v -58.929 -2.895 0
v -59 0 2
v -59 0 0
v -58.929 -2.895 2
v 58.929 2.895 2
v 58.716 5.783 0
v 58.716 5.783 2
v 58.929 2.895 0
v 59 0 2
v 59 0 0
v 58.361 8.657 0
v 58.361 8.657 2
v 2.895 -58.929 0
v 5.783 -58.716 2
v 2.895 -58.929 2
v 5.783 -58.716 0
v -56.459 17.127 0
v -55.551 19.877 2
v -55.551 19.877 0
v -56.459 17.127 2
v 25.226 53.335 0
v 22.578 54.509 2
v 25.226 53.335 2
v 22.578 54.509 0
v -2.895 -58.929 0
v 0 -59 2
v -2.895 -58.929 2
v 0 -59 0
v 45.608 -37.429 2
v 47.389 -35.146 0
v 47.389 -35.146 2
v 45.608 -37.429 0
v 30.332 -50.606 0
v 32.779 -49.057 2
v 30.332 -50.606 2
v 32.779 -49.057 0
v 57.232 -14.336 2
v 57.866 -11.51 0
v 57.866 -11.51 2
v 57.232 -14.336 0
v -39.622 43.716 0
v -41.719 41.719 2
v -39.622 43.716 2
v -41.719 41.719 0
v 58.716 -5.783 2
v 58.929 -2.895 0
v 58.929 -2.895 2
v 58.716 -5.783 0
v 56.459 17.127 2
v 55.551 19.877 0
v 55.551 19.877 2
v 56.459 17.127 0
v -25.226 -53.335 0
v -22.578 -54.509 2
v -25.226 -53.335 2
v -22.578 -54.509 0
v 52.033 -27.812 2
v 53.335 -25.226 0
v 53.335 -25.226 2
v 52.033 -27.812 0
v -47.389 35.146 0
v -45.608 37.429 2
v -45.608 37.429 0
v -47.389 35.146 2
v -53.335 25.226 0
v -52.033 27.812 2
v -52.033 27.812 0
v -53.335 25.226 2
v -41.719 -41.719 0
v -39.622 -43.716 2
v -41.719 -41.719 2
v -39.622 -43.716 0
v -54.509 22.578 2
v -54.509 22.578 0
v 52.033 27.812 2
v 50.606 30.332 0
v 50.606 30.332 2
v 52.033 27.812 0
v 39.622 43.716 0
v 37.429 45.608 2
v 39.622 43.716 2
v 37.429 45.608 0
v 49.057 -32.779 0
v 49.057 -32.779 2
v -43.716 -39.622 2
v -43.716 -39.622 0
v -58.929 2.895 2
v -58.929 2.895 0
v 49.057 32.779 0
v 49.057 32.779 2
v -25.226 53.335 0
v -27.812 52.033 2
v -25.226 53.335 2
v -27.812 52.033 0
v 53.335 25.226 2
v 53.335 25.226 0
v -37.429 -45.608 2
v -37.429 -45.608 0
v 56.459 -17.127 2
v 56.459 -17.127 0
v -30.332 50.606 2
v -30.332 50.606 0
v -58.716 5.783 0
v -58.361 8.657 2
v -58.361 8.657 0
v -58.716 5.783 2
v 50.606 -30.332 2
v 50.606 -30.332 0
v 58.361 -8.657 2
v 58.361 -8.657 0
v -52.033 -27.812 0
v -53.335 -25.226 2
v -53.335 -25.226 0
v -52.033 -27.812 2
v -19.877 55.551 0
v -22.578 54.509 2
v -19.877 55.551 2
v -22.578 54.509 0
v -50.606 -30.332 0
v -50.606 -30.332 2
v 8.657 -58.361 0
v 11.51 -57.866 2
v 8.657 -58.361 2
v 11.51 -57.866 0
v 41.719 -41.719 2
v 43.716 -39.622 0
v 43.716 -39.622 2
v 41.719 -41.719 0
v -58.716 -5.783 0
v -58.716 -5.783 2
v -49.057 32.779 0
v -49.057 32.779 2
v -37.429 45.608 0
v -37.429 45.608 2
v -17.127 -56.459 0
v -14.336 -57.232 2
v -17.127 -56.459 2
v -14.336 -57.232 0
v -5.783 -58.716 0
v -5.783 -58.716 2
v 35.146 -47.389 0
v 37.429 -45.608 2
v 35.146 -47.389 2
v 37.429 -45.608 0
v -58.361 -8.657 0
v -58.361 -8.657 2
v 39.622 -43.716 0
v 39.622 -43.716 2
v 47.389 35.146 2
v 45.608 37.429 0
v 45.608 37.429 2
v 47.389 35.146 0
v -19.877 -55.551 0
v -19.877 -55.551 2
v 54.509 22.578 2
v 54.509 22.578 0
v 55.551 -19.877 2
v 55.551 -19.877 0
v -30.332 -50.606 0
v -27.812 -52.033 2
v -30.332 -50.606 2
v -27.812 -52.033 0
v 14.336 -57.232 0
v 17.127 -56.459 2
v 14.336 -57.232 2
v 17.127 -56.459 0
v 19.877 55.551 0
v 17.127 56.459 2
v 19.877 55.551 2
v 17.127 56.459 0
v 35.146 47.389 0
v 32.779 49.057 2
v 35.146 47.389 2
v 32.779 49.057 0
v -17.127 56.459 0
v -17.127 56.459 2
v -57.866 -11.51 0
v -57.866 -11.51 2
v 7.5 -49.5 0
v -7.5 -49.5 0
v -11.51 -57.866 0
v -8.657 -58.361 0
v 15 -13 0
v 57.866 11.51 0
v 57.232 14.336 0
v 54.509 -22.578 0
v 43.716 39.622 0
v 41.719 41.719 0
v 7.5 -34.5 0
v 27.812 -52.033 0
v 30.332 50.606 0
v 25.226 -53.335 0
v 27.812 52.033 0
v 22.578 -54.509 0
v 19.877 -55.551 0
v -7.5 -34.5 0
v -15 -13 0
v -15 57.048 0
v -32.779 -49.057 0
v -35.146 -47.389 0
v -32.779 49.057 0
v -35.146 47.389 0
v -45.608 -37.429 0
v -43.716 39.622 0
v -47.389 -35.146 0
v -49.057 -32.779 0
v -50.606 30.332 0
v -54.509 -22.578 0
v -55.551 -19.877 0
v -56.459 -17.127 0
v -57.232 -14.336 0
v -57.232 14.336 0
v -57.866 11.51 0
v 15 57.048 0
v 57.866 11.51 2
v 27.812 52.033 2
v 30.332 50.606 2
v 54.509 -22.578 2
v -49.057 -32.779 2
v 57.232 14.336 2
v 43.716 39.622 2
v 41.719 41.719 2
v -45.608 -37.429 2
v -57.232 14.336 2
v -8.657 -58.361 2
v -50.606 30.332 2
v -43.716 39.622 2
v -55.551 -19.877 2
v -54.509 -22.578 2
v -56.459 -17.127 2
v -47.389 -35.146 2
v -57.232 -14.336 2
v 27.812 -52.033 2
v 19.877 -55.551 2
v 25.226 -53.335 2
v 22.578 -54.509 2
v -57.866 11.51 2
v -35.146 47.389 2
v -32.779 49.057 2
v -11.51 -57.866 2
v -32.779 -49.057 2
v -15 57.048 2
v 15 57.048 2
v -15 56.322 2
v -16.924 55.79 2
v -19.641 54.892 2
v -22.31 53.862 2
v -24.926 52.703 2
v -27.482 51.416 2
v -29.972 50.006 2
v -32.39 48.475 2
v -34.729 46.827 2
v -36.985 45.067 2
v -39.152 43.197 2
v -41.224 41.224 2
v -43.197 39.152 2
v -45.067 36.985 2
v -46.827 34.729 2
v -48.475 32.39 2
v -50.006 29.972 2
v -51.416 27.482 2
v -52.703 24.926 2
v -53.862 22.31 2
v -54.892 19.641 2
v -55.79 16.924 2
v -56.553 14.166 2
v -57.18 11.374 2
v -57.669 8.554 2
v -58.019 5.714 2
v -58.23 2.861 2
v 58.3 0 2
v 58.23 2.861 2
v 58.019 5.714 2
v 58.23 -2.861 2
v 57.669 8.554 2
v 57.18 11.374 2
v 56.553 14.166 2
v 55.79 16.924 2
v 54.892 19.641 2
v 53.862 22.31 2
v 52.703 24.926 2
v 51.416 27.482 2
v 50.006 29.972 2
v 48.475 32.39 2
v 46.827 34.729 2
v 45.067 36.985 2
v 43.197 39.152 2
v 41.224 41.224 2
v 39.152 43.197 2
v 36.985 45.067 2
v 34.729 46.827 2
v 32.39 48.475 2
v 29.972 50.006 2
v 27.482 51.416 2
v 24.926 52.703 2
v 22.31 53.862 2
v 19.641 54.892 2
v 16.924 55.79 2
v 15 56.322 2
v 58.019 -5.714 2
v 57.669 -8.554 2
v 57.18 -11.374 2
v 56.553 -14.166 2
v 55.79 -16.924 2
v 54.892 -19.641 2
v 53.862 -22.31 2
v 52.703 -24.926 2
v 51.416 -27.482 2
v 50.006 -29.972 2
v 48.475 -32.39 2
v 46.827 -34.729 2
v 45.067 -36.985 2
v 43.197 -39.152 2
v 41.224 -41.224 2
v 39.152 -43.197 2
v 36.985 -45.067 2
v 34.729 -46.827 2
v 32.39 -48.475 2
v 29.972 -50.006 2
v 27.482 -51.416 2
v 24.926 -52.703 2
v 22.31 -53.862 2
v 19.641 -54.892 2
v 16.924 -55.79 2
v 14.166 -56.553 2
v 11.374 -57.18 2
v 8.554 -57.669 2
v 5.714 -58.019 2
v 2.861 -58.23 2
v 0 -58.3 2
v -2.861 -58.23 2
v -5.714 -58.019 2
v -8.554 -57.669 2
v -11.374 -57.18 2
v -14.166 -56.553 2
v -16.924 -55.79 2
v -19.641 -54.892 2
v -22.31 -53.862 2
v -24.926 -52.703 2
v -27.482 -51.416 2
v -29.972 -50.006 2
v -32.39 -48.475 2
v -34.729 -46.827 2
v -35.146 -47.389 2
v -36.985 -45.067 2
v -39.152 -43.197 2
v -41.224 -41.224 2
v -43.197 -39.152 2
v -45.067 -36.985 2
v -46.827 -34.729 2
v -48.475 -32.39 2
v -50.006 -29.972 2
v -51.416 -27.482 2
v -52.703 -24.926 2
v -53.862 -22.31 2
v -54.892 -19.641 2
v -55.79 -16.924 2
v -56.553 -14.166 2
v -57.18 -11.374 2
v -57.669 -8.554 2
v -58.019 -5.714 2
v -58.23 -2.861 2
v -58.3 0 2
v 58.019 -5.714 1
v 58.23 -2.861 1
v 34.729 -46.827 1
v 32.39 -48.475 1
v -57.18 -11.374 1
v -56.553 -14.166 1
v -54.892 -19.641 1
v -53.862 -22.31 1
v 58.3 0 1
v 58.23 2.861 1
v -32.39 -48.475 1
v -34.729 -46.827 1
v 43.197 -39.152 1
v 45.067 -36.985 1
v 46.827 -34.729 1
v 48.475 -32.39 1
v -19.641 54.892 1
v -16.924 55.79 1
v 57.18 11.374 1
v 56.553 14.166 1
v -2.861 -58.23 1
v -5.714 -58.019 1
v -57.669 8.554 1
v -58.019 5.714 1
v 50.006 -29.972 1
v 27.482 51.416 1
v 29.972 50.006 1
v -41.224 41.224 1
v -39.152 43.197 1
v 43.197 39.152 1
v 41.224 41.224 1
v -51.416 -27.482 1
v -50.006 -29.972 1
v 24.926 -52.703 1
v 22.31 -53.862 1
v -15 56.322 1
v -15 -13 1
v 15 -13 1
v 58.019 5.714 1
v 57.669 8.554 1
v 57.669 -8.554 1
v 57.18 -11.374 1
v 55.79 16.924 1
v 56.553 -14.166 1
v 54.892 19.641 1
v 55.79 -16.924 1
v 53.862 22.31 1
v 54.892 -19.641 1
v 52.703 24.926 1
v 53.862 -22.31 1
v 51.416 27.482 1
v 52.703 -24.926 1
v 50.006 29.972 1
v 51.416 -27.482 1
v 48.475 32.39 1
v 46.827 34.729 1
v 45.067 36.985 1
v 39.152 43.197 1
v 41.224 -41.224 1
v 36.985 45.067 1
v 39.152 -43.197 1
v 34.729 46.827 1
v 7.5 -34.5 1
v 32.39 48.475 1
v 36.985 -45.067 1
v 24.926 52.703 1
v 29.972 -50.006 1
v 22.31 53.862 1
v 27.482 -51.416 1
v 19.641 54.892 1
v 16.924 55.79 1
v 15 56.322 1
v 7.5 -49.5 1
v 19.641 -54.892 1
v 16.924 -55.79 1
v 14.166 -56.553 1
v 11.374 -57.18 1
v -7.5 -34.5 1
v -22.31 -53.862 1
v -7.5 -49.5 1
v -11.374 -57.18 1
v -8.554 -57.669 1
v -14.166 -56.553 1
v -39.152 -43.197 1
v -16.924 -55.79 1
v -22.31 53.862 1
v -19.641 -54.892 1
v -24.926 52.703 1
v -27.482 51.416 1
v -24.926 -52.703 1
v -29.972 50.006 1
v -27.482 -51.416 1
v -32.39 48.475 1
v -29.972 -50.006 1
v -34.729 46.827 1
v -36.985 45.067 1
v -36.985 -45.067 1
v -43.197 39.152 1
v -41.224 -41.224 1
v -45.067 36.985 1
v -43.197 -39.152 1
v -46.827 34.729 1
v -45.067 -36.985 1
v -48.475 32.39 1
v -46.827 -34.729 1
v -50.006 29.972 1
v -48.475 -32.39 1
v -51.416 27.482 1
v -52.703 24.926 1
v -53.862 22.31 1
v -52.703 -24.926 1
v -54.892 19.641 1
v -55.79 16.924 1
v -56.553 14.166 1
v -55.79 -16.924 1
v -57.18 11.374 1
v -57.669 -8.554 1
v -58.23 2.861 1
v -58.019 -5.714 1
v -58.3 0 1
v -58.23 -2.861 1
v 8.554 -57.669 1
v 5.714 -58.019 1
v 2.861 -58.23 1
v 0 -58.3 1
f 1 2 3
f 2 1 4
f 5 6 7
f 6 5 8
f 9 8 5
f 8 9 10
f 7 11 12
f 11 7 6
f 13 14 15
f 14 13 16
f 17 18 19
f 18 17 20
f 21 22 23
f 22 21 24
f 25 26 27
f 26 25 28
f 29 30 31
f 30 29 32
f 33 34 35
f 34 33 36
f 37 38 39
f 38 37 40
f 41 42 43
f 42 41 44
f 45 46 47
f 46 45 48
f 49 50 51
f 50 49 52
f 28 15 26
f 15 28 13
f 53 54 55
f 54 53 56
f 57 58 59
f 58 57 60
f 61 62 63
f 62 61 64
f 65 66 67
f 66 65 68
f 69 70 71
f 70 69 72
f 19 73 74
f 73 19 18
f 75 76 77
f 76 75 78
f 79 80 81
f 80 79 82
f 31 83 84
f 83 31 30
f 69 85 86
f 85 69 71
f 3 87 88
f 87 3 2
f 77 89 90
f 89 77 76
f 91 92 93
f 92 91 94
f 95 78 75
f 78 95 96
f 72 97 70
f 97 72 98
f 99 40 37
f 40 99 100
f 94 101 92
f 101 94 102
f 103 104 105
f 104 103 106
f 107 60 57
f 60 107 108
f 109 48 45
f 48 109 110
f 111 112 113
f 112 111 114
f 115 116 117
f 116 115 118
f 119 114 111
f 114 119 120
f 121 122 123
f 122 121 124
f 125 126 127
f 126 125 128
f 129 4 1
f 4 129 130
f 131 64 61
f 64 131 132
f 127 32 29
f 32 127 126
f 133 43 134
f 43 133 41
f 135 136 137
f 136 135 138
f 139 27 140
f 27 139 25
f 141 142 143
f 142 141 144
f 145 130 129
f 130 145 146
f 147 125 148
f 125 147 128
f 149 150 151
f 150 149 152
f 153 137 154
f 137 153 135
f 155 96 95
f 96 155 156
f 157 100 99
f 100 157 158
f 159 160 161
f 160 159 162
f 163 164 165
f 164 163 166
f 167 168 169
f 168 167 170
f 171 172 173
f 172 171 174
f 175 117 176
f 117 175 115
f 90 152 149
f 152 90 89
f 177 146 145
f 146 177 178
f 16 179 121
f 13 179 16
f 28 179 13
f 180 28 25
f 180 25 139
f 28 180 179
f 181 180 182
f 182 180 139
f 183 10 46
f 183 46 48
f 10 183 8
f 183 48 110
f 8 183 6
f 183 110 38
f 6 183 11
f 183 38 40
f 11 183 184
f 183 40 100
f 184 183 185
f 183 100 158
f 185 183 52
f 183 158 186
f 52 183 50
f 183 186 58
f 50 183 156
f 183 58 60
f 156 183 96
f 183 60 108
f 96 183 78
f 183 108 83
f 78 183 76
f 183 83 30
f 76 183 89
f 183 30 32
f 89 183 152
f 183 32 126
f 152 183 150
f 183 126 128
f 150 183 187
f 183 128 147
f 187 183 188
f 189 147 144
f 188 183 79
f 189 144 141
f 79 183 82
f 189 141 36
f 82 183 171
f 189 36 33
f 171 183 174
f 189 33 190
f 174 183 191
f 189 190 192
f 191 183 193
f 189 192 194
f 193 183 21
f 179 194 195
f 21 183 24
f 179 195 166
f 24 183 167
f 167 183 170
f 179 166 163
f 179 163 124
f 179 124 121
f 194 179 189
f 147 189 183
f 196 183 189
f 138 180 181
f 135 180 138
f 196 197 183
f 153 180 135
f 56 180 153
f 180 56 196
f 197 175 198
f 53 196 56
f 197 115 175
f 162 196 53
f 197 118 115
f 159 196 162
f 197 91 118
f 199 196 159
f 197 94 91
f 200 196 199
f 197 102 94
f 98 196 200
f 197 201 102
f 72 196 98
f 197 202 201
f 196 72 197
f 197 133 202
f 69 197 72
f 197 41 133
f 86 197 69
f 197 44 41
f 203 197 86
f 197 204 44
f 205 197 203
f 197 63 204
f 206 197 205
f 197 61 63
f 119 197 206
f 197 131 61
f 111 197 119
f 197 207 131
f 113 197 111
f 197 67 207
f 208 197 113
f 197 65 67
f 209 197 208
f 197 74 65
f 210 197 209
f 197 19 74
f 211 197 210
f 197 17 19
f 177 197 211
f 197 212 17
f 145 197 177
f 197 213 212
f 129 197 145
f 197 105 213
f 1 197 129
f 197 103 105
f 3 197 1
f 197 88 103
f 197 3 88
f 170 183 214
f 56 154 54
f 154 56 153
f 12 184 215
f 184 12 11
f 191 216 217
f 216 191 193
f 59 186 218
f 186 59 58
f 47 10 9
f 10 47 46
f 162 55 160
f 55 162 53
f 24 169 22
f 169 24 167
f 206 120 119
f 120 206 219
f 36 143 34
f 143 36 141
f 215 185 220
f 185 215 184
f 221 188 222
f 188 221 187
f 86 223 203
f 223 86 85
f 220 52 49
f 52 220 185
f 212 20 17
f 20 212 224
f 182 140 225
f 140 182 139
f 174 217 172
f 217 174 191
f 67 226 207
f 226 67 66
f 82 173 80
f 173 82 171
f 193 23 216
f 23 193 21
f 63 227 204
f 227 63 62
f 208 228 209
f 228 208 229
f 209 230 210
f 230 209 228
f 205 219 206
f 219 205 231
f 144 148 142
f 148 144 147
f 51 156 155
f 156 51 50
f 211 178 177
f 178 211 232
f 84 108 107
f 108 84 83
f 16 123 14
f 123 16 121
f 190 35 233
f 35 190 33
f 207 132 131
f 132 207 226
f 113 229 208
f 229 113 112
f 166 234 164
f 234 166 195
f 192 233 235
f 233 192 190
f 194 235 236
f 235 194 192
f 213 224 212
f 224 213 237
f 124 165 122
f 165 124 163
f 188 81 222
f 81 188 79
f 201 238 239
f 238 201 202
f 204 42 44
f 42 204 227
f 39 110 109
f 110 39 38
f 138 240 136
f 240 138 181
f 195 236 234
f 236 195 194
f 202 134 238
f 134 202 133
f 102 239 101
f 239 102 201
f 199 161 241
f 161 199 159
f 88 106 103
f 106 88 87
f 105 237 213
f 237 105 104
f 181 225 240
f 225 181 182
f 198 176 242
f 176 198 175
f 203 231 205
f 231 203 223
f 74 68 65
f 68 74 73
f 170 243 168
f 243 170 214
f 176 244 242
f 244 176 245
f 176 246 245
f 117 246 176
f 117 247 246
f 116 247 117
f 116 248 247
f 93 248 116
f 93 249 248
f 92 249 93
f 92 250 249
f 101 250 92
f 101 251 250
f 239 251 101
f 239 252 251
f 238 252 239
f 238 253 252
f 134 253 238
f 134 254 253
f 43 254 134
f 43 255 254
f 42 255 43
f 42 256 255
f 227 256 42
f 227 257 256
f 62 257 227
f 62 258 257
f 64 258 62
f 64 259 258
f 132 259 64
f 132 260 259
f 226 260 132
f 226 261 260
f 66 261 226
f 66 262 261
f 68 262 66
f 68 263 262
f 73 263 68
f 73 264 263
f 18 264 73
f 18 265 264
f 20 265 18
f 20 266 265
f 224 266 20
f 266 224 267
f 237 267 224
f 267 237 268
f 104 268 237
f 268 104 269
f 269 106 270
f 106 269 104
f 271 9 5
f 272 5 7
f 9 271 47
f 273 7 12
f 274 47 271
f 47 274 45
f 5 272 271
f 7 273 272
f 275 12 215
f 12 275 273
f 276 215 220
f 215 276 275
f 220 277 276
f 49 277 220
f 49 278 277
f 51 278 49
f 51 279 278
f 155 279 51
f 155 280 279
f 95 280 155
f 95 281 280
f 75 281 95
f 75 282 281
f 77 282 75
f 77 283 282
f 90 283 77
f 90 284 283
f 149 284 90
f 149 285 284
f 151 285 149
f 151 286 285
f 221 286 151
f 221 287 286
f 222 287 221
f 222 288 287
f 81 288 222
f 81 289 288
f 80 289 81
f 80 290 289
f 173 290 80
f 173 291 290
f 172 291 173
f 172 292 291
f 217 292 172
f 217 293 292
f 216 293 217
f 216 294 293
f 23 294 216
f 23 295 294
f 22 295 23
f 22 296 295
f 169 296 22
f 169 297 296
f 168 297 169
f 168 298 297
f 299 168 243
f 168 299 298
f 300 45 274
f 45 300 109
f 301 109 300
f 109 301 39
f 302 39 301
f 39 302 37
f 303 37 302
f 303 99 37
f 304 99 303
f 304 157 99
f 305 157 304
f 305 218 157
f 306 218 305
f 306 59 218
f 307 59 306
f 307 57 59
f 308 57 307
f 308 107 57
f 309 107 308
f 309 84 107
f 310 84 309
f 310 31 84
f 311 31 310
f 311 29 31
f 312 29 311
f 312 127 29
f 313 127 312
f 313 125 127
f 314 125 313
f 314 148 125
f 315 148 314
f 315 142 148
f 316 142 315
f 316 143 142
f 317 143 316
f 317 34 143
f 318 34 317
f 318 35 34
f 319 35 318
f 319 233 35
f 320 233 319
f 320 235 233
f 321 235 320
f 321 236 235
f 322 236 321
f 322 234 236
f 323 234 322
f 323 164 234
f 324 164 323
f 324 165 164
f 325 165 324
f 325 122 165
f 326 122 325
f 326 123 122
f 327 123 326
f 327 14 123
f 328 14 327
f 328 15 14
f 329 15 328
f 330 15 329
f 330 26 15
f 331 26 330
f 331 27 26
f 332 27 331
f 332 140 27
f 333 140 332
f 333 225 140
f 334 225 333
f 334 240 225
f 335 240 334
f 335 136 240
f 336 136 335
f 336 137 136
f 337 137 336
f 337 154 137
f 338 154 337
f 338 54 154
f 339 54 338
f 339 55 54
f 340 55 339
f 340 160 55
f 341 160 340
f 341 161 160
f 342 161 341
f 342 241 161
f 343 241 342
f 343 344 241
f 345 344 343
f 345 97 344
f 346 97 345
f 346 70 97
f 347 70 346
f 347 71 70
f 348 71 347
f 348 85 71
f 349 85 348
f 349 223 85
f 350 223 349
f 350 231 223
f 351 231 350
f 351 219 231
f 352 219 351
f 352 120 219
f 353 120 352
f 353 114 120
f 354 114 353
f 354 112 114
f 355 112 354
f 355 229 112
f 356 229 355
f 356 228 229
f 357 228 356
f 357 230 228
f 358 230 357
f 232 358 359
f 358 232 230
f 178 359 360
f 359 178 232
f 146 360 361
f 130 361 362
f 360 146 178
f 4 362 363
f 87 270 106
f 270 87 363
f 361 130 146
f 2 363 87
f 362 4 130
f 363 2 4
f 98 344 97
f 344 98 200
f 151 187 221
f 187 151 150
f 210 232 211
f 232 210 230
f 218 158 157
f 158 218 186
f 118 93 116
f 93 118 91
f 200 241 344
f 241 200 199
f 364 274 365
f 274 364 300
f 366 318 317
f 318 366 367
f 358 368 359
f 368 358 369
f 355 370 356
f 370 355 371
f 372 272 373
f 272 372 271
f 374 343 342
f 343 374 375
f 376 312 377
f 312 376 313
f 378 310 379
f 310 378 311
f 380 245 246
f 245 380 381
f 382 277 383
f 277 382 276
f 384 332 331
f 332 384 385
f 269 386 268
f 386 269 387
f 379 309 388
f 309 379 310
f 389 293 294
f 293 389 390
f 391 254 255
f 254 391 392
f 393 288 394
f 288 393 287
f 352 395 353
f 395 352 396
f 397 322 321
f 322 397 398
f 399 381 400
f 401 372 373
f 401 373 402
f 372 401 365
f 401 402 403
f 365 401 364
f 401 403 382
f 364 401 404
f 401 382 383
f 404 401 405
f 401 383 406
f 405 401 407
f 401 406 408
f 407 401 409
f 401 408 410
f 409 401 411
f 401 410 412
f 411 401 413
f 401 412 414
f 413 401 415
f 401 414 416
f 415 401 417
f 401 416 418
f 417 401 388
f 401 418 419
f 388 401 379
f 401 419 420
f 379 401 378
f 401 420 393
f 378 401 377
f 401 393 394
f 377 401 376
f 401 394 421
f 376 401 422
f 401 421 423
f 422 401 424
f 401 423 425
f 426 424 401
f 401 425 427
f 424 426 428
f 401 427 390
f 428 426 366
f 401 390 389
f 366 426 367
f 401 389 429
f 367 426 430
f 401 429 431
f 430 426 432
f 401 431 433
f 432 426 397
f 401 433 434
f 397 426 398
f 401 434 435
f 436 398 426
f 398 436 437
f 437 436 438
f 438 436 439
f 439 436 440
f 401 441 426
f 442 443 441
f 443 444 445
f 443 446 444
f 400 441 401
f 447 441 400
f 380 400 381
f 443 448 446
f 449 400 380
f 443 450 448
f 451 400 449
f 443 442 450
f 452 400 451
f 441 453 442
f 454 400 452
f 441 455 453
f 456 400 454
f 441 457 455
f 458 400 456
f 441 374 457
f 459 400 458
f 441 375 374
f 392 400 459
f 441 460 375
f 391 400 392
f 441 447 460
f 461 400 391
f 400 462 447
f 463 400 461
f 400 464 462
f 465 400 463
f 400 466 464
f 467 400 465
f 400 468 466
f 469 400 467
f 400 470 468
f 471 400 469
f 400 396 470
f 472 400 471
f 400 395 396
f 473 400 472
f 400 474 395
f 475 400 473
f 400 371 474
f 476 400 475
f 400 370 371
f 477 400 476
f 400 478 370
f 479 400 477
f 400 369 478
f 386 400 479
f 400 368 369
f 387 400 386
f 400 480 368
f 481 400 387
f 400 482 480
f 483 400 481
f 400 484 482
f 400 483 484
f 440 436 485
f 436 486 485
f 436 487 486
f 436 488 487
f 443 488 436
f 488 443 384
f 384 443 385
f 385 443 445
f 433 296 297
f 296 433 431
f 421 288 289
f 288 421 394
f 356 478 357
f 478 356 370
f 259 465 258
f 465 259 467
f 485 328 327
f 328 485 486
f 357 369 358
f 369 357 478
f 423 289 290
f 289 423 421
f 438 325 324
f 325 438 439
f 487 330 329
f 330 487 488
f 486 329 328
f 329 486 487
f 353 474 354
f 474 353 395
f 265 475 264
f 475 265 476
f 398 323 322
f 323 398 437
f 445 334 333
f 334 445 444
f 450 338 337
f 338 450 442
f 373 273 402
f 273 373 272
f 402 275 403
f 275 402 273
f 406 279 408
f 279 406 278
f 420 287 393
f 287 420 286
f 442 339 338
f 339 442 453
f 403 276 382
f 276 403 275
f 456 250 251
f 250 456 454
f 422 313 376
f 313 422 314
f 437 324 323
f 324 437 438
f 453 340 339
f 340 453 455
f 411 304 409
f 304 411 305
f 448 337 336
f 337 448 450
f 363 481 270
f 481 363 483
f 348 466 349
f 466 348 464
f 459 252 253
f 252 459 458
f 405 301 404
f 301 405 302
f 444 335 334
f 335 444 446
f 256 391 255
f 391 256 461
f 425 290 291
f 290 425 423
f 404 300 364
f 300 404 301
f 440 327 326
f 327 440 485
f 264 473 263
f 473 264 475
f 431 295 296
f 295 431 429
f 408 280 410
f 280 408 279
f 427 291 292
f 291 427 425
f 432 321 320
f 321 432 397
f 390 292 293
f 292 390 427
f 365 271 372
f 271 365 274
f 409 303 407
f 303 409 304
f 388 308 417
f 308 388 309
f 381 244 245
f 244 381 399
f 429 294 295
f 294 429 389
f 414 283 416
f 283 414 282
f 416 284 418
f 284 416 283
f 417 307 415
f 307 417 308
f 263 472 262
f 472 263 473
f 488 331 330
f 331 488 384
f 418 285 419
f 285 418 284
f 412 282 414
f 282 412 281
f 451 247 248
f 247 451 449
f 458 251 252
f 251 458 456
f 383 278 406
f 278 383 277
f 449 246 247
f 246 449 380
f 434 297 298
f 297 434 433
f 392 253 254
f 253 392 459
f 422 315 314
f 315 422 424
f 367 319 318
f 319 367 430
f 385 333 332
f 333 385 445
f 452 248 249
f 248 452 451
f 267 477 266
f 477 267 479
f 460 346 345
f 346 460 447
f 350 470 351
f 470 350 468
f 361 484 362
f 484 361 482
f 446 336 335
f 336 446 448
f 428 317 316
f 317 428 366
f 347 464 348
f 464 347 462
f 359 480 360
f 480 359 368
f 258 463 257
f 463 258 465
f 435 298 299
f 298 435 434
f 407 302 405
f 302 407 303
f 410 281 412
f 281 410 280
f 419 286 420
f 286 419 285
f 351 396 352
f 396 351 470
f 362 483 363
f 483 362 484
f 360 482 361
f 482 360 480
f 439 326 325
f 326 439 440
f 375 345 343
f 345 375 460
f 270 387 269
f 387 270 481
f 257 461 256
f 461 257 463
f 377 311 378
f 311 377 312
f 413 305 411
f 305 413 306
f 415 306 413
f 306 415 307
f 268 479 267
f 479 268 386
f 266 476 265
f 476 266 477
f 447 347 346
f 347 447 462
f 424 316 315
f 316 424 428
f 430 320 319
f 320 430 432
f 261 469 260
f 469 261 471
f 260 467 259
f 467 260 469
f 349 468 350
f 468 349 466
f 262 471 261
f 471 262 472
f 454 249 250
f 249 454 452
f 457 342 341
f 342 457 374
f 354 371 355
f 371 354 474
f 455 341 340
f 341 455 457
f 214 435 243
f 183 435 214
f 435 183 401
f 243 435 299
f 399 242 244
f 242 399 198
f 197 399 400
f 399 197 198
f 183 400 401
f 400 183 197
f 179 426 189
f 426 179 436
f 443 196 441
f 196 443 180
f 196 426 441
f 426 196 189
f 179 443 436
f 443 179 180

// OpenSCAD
// file: chopper_cover.scad
fn = 128;
wheel_radius = 102 / 2;
support_width = 30;

mount_inner_edge_to_edge = 44;
mount_outer_edge_to_edge = 57;
mount_width = 6.5;
thickness = 3;
wheel_margin = 4;
mount_total_width = 69;
shield_radius = wheel_radius + wheel_margin;
shield_height = 25;
bridge_length = 30;
bridge_offset = 9 - wheel_margin;
bridge_y_offset = (shield_radius - bridge_length +
                   bridge_offset - thickness);
v_mount_y_offset = shield_radius + bridge_offset - thickness;
v_mount_height = 45;
mount_space_y_offset = (v_mount_y_offset -
                        bridge_length +
                        thickness);
aperture_size = 15;
aperture_offset = 42;

rebar_len = 4.5;

module shield() {
  union() {
    difference() {
      cylinder(h = shield_height,
               r1 = shield_radius+thickness,
               r2 = shield_radius+thickness, $fn=fn);
      translate([0, 0, thickness])
      cylinder(h = shield_height,
         r1 = shield_radius,
         r2 = shield_radius, $fn=fn);
    }

    translate([-mount_total_width/2, bridge_y_offset, 0])
    cube(size = [mount_total_width, bridge_length, thickness]);
    translate([-mount_total_width/2, v_mount_y_offset, 0])
    cube(size = [mount_total_width, thickness, v_mount_height]);
    translate([support_width/2, v_mount_y_offset-rebar_len, 0])
    cube(size = [thickness, rebar_len, shield_height]);
    translate([-support_width/2-thickness, v_mount_y_offset-rebar_len, 0])
    cube(size = [thickness, rebar_len, shield_height]);
  }
}

module apertures() {
  translate([-support_width/2,
             mount_space_y_offset,
             thickness])
  cube(size = [support_width, bridge_length, v_mount_height]);
  translate([-aperture_size/2,
             -aperture_size/2 - aperture_offset,
             -v_mount_height/2])
  cube(size = [aperture_size, aperture_size, v_mount_height]);
  translate([-mount_width/2 - mount_inner_edge_to_edge/2 - mount_width/2,
             -mount_width/2 + v_mount_y_offset, thickness + v_mount_height/3])
  cube(size = [mount_width, mount_width, v_mount_height/2]);
  translate([-mount_width/2 + mount_inner_edge_to_edge/2 + mount_width/2,
             -mount_width/2 + v_mount_y_offset, thickness + v_mount_height/3])
  cube(size = [mount_width, mount_width, v_mount_height/2]);  
}

module render() {
  difference() {
    shield();
    apertures();
  }
}

echo(version=version());
render();
// main file
fn = 128;

include <chopper_cover.scad>

cap_thickness = 1;
cap_radius = shield_radius+thickness;
mount_aperture_size = 90;
shim = 0.3;

echo(cap_radius=cap_radius);

module render() {
  difference() {
    difference() {
      cylinder(h = cap_thickness*2,
               r1 = cap_radius+cap_thickness,
               r2 = cap_radius+cap_thickness, $fn=fn);
      translate([0, 0, cap_thickness])
      cylinder(h = cap_thickness,
               r1 = cap_radius+shim,
               r2 = cap_radius+shim, $fn=fn);    
    }
    translate([-support_width/2, -13, 0])
    cube(size = [support_width, mount_aperture_size, 10]);
    translate([-aperture_size/2,
               -aperture_size/2 - aperture_offset,
               -v_mount_height/2])
    cube(size = [aperture_size, aperture_size, v_mount_height]);
  }
}

echo(version=version());
render();
